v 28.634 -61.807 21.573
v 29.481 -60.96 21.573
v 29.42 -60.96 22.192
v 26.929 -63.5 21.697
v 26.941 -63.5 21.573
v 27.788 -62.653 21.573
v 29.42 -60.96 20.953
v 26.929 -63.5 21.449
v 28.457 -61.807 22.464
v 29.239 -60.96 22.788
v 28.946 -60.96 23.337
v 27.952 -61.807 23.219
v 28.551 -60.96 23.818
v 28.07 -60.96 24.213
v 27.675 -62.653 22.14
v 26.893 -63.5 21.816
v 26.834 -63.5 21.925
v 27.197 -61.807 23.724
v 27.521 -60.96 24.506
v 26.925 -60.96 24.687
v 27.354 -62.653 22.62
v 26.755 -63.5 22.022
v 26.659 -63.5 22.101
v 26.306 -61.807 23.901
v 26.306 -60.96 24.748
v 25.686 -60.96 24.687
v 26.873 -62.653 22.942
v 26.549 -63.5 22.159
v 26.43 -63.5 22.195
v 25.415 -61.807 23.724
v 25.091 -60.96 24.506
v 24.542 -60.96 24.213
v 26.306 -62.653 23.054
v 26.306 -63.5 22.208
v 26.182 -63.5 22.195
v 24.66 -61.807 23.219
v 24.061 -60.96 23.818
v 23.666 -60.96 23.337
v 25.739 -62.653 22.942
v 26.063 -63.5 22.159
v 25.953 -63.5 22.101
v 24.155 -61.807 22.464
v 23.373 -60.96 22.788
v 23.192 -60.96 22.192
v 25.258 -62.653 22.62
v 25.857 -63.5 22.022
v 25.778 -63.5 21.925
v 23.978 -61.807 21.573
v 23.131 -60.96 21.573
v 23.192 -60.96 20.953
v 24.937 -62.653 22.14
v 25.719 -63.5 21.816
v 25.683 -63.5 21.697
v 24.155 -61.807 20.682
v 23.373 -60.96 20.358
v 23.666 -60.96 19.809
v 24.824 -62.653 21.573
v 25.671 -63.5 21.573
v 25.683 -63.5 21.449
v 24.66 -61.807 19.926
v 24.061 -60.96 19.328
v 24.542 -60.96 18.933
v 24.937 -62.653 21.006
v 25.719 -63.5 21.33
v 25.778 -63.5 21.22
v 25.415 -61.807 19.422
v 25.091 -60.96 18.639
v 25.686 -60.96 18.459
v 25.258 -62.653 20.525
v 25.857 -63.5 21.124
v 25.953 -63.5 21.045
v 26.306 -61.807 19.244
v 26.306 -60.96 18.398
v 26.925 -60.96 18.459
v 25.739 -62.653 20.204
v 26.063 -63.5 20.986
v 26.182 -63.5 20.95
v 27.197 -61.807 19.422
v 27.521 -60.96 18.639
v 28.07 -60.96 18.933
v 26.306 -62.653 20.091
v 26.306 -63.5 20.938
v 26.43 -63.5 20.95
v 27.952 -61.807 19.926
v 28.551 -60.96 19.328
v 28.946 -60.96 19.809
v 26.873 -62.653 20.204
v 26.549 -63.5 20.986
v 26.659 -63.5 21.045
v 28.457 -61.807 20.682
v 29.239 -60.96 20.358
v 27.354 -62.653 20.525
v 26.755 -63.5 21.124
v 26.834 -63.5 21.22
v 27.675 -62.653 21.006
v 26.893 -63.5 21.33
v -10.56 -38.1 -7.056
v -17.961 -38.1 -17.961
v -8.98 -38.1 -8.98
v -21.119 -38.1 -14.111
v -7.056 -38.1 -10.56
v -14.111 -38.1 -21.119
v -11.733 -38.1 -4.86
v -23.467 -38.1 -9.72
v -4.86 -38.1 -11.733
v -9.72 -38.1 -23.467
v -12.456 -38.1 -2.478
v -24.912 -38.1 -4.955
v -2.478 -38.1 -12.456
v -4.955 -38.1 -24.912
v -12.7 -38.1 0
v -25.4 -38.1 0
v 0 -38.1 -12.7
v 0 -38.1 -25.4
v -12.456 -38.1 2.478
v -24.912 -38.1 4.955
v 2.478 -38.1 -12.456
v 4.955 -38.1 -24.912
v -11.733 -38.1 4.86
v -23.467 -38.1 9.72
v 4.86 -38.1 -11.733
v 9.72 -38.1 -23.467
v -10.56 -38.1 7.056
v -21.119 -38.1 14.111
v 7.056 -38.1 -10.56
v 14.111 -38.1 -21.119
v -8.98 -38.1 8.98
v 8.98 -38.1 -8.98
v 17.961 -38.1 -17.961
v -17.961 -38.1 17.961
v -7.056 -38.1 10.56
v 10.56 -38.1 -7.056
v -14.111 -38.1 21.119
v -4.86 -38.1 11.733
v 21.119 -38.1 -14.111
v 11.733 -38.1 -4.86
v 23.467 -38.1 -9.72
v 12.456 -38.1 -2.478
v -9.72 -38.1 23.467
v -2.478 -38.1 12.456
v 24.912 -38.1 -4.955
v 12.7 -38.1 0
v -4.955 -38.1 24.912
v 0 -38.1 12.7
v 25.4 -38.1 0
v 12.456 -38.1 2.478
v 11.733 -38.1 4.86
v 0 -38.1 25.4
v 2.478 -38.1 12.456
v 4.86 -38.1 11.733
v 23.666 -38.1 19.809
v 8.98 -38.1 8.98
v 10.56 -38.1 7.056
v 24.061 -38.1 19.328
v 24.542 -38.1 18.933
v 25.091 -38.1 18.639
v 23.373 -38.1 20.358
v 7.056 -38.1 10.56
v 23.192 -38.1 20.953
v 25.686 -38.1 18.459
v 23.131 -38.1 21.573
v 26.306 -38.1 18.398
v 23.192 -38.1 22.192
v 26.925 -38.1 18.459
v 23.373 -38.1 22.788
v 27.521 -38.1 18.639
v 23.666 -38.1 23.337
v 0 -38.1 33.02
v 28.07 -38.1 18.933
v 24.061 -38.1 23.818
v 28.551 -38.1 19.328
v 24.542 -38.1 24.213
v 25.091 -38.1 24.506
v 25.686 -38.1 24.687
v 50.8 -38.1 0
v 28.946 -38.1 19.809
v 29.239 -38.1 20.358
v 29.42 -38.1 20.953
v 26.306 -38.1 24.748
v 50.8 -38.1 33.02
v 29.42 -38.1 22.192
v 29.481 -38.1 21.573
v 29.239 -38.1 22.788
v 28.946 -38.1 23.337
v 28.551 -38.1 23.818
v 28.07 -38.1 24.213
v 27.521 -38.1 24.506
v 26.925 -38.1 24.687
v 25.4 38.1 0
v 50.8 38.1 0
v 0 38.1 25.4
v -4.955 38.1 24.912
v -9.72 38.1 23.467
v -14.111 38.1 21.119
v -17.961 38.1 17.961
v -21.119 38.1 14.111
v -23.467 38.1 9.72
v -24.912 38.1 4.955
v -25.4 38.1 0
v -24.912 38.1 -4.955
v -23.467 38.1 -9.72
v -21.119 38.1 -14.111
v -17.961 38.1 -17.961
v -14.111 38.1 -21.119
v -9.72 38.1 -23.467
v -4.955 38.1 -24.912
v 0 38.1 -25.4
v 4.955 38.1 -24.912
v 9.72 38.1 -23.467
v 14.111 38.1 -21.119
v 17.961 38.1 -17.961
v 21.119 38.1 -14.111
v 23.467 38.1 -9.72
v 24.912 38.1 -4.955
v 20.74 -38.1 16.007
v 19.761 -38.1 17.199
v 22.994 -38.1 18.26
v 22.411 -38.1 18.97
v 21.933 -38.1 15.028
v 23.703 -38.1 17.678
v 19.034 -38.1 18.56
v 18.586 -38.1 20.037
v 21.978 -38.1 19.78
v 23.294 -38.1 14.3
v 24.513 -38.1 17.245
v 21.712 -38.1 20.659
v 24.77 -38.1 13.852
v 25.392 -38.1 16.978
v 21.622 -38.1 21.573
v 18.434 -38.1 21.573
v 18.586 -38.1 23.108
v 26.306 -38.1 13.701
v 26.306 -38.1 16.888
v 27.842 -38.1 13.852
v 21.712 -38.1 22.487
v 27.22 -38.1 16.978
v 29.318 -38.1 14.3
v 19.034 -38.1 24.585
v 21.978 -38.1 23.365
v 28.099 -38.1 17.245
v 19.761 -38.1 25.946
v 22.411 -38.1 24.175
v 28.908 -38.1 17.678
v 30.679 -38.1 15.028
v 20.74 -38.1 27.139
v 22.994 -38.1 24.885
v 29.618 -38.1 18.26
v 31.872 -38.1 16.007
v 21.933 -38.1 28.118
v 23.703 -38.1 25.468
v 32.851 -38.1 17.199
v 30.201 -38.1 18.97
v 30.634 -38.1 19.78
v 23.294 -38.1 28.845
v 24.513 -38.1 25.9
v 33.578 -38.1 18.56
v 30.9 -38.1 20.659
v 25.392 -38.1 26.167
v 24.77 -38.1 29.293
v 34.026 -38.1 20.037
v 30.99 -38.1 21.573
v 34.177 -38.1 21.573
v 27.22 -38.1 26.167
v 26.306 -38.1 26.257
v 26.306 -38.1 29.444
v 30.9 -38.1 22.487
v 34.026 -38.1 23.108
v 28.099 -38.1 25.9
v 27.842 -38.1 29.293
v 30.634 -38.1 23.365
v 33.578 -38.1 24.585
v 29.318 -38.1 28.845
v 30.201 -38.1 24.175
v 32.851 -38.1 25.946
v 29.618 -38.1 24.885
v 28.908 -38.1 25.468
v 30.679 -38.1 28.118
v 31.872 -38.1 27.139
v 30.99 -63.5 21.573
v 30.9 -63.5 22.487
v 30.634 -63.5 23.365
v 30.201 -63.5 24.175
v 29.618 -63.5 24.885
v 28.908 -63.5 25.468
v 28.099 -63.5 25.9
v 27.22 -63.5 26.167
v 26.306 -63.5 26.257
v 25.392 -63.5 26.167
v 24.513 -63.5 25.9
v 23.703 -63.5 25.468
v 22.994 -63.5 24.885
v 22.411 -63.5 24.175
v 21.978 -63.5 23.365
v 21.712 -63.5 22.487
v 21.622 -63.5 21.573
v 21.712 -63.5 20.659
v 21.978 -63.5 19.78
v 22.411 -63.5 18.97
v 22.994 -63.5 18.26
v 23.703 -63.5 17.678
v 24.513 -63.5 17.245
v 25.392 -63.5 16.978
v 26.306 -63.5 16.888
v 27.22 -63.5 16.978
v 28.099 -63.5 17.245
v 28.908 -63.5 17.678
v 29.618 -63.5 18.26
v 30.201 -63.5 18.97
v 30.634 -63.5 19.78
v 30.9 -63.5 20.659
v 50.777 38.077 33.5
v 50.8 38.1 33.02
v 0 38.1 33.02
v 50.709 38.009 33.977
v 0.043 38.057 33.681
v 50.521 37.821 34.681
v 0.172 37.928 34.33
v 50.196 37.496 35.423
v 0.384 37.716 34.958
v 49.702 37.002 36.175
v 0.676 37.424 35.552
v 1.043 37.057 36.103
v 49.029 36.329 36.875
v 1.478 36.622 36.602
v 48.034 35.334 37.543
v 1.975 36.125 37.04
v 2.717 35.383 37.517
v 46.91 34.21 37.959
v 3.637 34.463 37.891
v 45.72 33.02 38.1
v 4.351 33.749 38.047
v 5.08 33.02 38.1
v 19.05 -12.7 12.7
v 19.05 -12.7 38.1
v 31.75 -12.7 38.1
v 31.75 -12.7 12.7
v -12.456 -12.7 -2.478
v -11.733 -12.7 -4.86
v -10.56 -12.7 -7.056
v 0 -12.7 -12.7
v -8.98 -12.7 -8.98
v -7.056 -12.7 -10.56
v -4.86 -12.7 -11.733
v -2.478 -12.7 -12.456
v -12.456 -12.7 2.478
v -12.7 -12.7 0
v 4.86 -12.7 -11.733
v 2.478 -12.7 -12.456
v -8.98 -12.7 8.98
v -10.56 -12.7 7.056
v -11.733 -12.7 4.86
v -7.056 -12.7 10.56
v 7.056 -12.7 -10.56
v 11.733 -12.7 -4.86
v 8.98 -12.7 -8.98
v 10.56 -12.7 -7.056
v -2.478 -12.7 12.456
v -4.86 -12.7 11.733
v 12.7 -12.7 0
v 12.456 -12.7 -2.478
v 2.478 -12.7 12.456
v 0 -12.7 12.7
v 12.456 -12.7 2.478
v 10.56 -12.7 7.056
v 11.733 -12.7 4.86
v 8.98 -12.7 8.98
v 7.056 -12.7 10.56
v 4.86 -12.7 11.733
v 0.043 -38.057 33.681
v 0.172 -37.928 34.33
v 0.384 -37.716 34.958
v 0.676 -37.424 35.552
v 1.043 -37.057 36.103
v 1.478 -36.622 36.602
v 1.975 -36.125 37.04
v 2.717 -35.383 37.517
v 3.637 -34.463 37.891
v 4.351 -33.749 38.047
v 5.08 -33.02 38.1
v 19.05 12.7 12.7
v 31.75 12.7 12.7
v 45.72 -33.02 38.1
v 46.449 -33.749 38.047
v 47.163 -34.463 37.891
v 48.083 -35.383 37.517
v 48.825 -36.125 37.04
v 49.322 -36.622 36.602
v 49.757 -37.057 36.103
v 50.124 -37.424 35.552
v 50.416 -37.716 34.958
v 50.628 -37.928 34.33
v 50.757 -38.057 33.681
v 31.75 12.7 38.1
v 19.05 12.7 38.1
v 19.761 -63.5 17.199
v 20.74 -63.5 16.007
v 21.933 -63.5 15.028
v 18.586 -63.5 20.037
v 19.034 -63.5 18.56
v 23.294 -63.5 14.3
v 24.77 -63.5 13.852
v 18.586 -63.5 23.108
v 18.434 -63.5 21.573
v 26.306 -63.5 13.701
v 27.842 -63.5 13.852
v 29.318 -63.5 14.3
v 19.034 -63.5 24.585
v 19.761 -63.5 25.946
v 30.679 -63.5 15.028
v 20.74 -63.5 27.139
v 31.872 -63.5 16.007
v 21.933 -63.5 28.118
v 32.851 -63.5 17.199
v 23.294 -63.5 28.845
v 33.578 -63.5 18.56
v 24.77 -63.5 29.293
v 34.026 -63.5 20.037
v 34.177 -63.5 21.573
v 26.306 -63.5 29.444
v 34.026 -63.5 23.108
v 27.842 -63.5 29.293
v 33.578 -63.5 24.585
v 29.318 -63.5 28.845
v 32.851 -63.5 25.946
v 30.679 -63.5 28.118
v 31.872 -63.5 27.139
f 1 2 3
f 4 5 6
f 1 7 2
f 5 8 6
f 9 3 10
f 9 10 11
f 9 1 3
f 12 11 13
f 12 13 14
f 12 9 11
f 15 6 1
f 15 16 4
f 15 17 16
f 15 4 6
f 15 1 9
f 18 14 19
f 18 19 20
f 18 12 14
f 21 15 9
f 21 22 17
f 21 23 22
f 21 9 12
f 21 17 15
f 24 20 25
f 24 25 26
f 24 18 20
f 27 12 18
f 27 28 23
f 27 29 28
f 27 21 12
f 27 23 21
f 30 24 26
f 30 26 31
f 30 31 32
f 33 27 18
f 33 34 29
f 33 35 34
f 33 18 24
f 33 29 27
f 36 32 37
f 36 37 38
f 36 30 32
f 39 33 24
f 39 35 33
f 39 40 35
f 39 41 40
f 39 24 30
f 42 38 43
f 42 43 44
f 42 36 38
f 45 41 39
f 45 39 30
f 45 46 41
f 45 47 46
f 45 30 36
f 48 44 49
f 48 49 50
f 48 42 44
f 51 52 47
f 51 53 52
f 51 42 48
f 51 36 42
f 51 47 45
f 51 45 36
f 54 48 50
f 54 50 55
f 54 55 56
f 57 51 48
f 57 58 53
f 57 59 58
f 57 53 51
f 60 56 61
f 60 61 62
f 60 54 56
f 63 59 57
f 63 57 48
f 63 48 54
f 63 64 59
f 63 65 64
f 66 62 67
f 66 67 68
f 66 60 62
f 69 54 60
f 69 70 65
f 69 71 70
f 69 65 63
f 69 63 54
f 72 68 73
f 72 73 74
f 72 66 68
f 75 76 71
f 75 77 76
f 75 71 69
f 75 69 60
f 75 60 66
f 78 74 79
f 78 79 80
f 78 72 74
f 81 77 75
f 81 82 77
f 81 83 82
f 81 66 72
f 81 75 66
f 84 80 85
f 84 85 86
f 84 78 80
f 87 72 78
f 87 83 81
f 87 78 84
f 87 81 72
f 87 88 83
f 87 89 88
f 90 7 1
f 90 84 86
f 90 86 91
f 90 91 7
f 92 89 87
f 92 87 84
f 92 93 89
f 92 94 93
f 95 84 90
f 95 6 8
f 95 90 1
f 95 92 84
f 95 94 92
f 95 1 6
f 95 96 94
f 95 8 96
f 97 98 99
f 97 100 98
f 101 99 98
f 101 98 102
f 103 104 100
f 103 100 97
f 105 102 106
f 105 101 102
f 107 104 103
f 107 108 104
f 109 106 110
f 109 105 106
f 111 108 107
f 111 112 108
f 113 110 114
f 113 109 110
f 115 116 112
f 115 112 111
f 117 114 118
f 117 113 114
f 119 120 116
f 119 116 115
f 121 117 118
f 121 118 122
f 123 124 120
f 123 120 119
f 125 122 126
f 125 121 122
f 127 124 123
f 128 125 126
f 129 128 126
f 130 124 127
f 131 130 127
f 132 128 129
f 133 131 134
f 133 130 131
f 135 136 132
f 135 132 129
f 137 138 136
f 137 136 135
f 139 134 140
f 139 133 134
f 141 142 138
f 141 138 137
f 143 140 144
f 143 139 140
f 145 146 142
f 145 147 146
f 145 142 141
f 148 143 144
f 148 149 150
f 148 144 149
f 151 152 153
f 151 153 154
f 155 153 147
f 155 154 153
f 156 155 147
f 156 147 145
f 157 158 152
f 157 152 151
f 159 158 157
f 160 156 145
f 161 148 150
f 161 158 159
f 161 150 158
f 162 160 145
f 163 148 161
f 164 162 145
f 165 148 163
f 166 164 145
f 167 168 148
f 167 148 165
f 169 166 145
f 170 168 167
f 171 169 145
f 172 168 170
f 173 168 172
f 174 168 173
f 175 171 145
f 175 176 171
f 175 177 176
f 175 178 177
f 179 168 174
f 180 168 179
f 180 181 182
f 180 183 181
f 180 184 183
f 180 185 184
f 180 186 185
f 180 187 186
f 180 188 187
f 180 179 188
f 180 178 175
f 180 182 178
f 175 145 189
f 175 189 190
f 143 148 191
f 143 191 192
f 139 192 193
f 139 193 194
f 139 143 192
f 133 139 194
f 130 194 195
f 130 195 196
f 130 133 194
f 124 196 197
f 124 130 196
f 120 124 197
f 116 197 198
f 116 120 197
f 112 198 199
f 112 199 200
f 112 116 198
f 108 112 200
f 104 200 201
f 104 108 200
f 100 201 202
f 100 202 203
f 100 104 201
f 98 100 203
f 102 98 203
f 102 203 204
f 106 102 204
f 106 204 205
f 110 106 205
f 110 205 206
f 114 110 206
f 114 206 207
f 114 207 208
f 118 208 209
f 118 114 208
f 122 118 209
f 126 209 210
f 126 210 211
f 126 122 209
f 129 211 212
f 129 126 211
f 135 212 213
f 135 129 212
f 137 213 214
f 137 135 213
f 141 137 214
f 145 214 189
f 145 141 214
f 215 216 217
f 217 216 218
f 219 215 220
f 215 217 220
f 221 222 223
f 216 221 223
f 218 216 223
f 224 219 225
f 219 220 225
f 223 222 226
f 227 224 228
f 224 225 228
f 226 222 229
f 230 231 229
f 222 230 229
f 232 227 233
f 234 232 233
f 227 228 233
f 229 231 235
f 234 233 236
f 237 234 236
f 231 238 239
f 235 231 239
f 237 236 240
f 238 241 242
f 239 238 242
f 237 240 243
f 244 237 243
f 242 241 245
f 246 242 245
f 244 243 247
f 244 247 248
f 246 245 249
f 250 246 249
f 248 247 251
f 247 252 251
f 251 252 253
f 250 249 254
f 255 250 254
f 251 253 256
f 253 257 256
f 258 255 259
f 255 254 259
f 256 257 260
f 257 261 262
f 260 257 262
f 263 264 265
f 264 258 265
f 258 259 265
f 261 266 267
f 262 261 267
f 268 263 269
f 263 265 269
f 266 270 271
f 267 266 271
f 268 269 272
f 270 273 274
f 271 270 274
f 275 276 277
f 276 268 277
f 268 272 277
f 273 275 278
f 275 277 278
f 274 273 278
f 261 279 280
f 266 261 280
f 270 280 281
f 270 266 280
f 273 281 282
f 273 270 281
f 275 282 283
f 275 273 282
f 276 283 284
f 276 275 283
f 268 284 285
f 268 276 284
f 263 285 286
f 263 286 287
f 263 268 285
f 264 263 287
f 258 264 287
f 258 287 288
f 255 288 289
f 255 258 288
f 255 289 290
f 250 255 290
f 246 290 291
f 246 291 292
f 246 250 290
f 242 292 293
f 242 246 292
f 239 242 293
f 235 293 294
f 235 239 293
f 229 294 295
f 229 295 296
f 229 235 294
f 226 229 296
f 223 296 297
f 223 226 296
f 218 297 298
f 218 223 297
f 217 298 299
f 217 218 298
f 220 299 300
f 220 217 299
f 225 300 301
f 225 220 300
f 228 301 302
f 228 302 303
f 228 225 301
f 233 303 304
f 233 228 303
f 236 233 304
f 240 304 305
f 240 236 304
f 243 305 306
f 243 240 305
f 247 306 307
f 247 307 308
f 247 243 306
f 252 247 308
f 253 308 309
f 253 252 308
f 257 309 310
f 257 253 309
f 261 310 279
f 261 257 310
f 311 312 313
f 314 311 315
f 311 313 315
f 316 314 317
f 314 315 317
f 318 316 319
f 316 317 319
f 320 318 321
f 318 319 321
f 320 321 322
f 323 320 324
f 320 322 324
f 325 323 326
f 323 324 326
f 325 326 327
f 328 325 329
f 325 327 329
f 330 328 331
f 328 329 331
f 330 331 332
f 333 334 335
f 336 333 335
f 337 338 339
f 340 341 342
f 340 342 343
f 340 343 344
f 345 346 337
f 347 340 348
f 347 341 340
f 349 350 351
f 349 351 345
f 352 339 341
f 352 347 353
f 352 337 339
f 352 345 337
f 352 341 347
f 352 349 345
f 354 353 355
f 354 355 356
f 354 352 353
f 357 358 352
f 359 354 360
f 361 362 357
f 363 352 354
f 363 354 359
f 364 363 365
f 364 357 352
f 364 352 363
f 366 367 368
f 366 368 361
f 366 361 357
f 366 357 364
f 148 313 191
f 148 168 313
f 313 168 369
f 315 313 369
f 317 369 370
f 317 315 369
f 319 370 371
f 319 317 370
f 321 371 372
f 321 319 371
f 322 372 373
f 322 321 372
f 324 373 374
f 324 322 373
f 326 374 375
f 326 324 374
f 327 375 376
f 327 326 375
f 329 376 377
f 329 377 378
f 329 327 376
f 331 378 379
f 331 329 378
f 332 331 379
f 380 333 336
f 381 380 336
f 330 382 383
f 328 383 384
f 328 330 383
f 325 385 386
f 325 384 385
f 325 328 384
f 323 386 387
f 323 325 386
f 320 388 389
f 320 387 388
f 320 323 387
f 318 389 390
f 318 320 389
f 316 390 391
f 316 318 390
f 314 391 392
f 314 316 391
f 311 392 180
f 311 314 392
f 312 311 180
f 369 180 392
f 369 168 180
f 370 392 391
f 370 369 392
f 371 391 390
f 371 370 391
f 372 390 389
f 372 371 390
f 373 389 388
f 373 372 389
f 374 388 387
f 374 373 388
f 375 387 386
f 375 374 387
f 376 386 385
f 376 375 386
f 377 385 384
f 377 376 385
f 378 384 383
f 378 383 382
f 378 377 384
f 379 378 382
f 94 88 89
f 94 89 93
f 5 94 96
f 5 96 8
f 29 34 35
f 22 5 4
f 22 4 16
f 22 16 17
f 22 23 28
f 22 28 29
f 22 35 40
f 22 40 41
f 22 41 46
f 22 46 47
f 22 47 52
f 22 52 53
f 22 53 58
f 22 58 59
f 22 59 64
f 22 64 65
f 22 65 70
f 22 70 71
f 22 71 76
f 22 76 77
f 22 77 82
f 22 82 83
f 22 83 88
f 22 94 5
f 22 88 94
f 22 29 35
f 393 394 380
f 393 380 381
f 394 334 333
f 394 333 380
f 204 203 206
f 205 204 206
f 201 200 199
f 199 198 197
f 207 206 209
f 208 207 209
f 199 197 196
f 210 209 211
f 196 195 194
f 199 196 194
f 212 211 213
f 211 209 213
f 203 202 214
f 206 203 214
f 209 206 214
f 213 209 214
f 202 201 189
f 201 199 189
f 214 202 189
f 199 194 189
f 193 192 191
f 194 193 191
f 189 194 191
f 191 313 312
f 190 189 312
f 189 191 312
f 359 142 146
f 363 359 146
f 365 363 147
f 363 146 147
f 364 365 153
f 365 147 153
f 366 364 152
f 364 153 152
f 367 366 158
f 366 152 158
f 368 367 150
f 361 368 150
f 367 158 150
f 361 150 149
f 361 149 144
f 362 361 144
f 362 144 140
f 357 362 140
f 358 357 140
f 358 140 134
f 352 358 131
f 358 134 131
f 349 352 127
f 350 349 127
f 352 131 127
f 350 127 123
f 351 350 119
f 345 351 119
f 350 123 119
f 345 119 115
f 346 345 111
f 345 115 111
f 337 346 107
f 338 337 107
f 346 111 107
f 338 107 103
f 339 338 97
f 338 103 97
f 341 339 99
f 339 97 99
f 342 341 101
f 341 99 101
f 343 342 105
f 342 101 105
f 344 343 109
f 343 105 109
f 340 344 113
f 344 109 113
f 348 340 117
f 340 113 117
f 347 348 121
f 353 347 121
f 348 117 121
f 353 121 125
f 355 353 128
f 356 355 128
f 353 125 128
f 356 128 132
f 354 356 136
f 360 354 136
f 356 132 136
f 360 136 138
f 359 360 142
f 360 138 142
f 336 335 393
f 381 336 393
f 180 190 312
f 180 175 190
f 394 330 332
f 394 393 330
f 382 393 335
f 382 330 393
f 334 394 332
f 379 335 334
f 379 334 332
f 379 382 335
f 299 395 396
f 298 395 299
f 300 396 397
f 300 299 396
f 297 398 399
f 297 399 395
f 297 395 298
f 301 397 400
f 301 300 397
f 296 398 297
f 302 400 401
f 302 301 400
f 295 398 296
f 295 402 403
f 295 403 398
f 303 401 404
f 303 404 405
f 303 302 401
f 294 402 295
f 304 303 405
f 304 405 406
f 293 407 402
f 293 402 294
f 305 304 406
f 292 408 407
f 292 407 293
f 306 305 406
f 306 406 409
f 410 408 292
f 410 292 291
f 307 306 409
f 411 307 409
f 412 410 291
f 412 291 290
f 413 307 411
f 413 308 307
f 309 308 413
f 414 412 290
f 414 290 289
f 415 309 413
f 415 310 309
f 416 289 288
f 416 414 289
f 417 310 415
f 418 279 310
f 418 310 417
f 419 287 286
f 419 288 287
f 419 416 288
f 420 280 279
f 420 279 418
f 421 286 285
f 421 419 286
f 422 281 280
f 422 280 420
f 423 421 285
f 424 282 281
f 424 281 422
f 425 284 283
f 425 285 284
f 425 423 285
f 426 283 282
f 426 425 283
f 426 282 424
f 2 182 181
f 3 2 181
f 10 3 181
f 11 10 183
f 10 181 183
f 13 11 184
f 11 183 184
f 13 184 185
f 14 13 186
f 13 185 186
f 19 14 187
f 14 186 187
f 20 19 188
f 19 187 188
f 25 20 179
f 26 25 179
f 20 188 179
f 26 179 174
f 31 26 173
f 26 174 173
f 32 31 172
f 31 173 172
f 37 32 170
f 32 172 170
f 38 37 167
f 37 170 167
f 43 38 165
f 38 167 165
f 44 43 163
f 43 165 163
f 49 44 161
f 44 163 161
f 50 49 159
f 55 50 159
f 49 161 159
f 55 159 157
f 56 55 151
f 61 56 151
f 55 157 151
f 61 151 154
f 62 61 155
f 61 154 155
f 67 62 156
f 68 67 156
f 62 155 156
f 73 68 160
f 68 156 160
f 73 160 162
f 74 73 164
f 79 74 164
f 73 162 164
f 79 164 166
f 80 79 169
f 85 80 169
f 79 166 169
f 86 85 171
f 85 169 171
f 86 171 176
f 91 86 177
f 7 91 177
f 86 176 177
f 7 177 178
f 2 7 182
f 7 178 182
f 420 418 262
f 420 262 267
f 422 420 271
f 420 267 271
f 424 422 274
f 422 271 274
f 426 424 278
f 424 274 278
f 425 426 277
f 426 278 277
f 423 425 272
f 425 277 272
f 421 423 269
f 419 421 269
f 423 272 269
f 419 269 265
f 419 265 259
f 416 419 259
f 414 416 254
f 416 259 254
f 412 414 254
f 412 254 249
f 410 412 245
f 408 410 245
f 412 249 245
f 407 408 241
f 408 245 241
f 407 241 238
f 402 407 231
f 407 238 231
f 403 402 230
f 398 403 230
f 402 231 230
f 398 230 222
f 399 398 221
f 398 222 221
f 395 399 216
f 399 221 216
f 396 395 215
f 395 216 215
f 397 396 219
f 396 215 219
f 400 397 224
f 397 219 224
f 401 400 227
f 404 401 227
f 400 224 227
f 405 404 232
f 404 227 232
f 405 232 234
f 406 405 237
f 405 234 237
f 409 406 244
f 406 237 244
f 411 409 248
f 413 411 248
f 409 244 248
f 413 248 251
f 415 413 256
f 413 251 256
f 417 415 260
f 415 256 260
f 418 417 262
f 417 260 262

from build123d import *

# Parameters (mm, degrees)
F1_DEPTH  = 38.1
F2_W      = 12.7
F2_H      = 25.4
F3_DEPTH  = 25.4
F4_R      = 5.08
F5_R      = 12.7
F6_DEPTH  = 25.4
F7_R      = 3.175
F8_DEPTH  = 25.4
F9_SIZE   = 2.54
F10_R     = 7.871547
F10_R_2   = 4.684347
F11_DEPTH = 25.4


with BuildPart() as f1:
    # F0 (on Front) → F1 (new body, symmetric)
    with BuildSketch(Plane.XZ):
        with BuildLine():
            Line((0, 38.1), (0, 25.4))
            ThreePointArc((0, 25.4), (-17.960512, -17.960512), (25.4, 0))
            Line((25.4, 0), (50.8, 0))
            Line((50.8, 0), (50.8, 38.1))
            Line((50.8, 38.1), (0, 38.1))
        make_face()
    extrude(amount=F1_DEPTH, both=True)

    # F2 (on face) → F3 (cut)
    with BuildSketch(Plane.XY.offset(38.1)):
        with Locations((25.4, 0)):
            Rectangle(F2_W, F2_H)
    extrude(amount=-F3_DEPTH, mode=Mode.SUBTRACT)

    # F4
    f4_edges = [f1.edges().sort_by_distance(p)[0] for p in [
        (25.4, -38.1, 38.1),
        (50.8, 0, 38.1),
        (25.4, 38.1, 38.1),
        (0, 0, 38.1),
    ]]
    fillet(f4_edges, radius=F4_R)

    # F5 (on face) → F6 (cut)
    with BuildSketch(Plane.XZ.offset(38.1)):
        Circle(F5_R)
    extrude(amount=-F6_DEPTH, mode=Mode.SUBTRACT)

    # F7 (on face) → F8 (join)
    with BuildSketch(Plane.XZ.offset(38.1)):
        with Locations((26.305903, 21.572661)):
            Circle(F7_R)
    extrude(amount=F8_DEPTH)

    # F9
    f9_edges = [f1.edges().sort_by_distance(p)[0] for p in [
        (23.130903, -63.5, 21.572661),
    ]]
    chamfer(f9_edges, length=F9_SIZE)


with BuildPart() as f11:
    # F10 (on face) → F11 (new body)
    with BuildSketch(Plane.XZ.offset(38.1)):
        with Locations((26.305903, 21.572661)):
            Circle(F10_R)
        with Locations((26.305903, 21.572661)):
            Circle(F10_R_2, mode=Mode.SUBTRACT)
    extrude(amount=F11_DEPTH)


solid = Compound([f1.part, f11.part])
